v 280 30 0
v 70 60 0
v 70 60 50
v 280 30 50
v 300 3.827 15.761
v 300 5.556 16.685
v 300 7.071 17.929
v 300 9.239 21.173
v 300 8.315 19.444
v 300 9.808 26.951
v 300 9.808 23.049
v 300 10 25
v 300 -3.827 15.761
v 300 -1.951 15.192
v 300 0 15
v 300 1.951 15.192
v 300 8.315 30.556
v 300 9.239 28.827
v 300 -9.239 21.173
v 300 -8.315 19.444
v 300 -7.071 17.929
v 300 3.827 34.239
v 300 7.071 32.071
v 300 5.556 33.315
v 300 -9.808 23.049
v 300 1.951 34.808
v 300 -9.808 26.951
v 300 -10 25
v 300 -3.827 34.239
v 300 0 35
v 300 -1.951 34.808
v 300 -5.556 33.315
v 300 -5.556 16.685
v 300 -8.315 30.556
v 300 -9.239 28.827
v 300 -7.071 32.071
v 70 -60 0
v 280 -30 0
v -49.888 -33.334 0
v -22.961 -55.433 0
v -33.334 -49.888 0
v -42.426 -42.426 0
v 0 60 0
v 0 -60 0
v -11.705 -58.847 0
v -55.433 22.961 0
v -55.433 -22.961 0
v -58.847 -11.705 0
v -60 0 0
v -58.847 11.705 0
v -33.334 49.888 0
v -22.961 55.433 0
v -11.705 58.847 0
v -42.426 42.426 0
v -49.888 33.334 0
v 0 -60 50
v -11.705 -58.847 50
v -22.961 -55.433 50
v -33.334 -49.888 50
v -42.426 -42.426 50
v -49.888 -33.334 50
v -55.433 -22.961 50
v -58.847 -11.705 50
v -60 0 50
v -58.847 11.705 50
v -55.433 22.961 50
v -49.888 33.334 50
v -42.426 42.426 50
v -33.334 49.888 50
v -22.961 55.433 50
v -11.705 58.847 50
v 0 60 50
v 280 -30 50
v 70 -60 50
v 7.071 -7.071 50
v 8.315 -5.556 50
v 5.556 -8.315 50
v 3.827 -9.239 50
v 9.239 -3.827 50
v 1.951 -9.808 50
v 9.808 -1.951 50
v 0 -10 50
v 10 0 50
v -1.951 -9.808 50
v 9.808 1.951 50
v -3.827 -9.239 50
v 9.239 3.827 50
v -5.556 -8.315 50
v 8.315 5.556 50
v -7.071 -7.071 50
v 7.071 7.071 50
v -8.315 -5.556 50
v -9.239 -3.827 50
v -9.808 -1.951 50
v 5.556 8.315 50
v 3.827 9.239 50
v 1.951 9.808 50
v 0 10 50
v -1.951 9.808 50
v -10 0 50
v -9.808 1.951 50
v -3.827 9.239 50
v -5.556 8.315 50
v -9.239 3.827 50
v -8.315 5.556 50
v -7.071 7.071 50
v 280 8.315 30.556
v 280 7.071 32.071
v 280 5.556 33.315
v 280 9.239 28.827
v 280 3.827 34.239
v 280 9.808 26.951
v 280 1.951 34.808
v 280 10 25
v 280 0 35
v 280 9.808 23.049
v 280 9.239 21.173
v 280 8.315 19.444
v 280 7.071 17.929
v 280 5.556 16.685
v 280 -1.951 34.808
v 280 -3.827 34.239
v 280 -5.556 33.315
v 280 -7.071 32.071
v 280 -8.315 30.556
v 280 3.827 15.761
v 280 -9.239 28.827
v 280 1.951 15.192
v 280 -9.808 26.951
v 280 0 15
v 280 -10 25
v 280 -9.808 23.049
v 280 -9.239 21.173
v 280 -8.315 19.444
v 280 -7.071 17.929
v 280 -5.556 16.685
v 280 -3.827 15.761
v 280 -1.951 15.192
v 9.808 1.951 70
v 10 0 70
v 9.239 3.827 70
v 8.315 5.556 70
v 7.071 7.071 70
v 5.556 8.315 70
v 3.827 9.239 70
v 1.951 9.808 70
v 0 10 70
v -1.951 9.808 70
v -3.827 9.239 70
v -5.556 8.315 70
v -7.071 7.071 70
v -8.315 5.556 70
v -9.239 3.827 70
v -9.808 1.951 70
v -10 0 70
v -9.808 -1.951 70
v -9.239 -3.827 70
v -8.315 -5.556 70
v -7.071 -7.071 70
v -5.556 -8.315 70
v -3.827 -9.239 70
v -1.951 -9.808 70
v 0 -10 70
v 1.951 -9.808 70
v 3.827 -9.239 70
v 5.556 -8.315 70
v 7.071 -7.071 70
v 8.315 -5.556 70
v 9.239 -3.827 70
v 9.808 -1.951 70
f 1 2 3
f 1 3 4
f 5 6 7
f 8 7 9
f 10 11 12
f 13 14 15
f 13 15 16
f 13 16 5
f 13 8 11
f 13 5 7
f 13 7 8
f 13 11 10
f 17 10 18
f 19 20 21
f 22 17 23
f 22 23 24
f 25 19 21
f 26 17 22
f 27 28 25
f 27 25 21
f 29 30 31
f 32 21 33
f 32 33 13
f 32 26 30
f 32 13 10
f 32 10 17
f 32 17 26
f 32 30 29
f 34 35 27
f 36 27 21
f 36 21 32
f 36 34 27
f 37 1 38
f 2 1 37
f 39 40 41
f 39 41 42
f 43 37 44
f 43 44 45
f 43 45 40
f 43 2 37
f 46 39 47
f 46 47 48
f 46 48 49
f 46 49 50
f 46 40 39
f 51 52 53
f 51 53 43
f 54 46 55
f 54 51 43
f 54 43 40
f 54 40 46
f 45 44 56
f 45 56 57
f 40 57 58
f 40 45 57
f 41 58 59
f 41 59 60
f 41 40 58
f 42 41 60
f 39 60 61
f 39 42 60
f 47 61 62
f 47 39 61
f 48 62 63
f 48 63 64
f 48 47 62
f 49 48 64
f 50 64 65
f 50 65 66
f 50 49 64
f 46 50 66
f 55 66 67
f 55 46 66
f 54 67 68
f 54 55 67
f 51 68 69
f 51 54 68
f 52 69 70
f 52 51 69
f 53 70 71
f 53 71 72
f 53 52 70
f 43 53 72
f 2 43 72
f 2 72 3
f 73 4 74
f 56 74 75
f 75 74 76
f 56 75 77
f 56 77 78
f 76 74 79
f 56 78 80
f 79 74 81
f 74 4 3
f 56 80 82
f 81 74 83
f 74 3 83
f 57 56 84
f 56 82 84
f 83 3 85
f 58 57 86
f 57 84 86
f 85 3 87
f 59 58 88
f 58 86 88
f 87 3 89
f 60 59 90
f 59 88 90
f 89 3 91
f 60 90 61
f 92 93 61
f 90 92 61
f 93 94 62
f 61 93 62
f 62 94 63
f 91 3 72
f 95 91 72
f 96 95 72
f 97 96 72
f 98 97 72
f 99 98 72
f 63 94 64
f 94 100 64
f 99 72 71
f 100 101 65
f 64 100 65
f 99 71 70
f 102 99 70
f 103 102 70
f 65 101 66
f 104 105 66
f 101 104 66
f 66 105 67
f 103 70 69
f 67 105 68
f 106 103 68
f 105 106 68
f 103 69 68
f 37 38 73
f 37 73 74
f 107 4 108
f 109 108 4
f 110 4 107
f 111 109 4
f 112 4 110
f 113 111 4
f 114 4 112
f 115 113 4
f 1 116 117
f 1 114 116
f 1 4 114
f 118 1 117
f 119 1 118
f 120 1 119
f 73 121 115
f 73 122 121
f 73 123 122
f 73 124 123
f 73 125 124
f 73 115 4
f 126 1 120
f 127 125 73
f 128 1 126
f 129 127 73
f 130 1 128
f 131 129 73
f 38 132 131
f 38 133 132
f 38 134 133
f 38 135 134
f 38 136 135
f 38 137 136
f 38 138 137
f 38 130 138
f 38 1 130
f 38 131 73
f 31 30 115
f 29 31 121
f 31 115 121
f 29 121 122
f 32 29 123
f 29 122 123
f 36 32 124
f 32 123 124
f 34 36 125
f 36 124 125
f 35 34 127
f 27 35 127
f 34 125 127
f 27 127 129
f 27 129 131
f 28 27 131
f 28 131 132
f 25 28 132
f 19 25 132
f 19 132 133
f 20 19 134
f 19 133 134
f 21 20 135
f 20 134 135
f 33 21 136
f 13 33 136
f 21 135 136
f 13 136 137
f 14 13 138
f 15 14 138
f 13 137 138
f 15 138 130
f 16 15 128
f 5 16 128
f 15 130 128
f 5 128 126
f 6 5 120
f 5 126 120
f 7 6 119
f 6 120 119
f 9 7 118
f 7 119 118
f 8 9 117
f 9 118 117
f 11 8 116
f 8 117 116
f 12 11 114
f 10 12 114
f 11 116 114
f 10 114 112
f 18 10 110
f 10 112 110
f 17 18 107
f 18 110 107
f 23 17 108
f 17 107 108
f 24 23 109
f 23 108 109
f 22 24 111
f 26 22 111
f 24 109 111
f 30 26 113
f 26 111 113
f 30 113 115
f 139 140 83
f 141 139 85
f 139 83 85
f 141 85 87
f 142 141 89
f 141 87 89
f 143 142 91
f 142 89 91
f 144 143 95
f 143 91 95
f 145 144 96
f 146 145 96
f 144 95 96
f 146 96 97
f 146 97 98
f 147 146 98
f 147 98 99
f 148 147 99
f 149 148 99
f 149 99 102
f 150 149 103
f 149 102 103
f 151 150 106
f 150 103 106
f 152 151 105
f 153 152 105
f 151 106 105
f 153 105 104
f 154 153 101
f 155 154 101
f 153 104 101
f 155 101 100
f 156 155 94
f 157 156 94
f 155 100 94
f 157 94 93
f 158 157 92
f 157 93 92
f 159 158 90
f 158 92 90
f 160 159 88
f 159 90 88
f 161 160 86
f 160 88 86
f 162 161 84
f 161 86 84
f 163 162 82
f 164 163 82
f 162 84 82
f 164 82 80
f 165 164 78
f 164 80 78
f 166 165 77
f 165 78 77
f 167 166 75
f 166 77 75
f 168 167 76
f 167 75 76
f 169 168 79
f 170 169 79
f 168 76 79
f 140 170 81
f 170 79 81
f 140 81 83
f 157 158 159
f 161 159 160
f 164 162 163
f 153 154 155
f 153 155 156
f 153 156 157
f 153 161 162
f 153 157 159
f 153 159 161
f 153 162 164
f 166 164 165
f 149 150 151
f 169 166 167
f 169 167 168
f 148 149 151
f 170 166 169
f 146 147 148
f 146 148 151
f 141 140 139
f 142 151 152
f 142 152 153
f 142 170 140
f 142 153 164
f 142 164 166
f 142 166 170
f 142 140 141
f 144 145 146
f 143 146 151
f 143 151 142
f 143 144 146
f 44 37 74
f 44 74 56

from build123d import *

# Parameters (mm, degrees)
BOSS_EXTRUDE1_DEPTH = 50
SKETCH2_R           = 10
BOSS_EXTRUDE2_DEPTH = 20
SKETCH3_R           = 10
BOSS_EXTRUDE3_DEPTH = 20


with BuildPart() as part:
    # Sketch1 → Boss-Extrude1 (new body)
    with BuildSketch(Plane.XY):
        with BuildLine():
            Line((0, 60), (70, 60))
            Line((70, 60), (280, 30))
            Line((280, 30), (280, -30))
            Line((280, -30), (70, -60))
            Line((70, -60), (0, -60))
            ThreePointArc((0, -60), (-60, 0), (0, 60))
        make_face()
    extrude(amount=BOSS_EXTRUDE1_DEPTH)

    # Sketch2 → Boss-Extrude2 (add)
    with BuildSketch(Plane.XY.offset(50)):
        Circle(SKETCH2_R)
    extrude(amount=BOSS_EXTRUDE2_DEPTH)

    # Sketch3 → Boss-Extrude3 (add)
    with BuildSketch(Plane(origin=(280, 0, 0), x_dir=(0, 0, -1), z_dir=(1, 0, 0))):
        with Locations(Location((-25, 0, 0), (0, 0, 180))):
            Circle(SKETCH3_R)
    extrude(amount=BOSS_EXTRUDE3_DEPTH)


solid = part.part
